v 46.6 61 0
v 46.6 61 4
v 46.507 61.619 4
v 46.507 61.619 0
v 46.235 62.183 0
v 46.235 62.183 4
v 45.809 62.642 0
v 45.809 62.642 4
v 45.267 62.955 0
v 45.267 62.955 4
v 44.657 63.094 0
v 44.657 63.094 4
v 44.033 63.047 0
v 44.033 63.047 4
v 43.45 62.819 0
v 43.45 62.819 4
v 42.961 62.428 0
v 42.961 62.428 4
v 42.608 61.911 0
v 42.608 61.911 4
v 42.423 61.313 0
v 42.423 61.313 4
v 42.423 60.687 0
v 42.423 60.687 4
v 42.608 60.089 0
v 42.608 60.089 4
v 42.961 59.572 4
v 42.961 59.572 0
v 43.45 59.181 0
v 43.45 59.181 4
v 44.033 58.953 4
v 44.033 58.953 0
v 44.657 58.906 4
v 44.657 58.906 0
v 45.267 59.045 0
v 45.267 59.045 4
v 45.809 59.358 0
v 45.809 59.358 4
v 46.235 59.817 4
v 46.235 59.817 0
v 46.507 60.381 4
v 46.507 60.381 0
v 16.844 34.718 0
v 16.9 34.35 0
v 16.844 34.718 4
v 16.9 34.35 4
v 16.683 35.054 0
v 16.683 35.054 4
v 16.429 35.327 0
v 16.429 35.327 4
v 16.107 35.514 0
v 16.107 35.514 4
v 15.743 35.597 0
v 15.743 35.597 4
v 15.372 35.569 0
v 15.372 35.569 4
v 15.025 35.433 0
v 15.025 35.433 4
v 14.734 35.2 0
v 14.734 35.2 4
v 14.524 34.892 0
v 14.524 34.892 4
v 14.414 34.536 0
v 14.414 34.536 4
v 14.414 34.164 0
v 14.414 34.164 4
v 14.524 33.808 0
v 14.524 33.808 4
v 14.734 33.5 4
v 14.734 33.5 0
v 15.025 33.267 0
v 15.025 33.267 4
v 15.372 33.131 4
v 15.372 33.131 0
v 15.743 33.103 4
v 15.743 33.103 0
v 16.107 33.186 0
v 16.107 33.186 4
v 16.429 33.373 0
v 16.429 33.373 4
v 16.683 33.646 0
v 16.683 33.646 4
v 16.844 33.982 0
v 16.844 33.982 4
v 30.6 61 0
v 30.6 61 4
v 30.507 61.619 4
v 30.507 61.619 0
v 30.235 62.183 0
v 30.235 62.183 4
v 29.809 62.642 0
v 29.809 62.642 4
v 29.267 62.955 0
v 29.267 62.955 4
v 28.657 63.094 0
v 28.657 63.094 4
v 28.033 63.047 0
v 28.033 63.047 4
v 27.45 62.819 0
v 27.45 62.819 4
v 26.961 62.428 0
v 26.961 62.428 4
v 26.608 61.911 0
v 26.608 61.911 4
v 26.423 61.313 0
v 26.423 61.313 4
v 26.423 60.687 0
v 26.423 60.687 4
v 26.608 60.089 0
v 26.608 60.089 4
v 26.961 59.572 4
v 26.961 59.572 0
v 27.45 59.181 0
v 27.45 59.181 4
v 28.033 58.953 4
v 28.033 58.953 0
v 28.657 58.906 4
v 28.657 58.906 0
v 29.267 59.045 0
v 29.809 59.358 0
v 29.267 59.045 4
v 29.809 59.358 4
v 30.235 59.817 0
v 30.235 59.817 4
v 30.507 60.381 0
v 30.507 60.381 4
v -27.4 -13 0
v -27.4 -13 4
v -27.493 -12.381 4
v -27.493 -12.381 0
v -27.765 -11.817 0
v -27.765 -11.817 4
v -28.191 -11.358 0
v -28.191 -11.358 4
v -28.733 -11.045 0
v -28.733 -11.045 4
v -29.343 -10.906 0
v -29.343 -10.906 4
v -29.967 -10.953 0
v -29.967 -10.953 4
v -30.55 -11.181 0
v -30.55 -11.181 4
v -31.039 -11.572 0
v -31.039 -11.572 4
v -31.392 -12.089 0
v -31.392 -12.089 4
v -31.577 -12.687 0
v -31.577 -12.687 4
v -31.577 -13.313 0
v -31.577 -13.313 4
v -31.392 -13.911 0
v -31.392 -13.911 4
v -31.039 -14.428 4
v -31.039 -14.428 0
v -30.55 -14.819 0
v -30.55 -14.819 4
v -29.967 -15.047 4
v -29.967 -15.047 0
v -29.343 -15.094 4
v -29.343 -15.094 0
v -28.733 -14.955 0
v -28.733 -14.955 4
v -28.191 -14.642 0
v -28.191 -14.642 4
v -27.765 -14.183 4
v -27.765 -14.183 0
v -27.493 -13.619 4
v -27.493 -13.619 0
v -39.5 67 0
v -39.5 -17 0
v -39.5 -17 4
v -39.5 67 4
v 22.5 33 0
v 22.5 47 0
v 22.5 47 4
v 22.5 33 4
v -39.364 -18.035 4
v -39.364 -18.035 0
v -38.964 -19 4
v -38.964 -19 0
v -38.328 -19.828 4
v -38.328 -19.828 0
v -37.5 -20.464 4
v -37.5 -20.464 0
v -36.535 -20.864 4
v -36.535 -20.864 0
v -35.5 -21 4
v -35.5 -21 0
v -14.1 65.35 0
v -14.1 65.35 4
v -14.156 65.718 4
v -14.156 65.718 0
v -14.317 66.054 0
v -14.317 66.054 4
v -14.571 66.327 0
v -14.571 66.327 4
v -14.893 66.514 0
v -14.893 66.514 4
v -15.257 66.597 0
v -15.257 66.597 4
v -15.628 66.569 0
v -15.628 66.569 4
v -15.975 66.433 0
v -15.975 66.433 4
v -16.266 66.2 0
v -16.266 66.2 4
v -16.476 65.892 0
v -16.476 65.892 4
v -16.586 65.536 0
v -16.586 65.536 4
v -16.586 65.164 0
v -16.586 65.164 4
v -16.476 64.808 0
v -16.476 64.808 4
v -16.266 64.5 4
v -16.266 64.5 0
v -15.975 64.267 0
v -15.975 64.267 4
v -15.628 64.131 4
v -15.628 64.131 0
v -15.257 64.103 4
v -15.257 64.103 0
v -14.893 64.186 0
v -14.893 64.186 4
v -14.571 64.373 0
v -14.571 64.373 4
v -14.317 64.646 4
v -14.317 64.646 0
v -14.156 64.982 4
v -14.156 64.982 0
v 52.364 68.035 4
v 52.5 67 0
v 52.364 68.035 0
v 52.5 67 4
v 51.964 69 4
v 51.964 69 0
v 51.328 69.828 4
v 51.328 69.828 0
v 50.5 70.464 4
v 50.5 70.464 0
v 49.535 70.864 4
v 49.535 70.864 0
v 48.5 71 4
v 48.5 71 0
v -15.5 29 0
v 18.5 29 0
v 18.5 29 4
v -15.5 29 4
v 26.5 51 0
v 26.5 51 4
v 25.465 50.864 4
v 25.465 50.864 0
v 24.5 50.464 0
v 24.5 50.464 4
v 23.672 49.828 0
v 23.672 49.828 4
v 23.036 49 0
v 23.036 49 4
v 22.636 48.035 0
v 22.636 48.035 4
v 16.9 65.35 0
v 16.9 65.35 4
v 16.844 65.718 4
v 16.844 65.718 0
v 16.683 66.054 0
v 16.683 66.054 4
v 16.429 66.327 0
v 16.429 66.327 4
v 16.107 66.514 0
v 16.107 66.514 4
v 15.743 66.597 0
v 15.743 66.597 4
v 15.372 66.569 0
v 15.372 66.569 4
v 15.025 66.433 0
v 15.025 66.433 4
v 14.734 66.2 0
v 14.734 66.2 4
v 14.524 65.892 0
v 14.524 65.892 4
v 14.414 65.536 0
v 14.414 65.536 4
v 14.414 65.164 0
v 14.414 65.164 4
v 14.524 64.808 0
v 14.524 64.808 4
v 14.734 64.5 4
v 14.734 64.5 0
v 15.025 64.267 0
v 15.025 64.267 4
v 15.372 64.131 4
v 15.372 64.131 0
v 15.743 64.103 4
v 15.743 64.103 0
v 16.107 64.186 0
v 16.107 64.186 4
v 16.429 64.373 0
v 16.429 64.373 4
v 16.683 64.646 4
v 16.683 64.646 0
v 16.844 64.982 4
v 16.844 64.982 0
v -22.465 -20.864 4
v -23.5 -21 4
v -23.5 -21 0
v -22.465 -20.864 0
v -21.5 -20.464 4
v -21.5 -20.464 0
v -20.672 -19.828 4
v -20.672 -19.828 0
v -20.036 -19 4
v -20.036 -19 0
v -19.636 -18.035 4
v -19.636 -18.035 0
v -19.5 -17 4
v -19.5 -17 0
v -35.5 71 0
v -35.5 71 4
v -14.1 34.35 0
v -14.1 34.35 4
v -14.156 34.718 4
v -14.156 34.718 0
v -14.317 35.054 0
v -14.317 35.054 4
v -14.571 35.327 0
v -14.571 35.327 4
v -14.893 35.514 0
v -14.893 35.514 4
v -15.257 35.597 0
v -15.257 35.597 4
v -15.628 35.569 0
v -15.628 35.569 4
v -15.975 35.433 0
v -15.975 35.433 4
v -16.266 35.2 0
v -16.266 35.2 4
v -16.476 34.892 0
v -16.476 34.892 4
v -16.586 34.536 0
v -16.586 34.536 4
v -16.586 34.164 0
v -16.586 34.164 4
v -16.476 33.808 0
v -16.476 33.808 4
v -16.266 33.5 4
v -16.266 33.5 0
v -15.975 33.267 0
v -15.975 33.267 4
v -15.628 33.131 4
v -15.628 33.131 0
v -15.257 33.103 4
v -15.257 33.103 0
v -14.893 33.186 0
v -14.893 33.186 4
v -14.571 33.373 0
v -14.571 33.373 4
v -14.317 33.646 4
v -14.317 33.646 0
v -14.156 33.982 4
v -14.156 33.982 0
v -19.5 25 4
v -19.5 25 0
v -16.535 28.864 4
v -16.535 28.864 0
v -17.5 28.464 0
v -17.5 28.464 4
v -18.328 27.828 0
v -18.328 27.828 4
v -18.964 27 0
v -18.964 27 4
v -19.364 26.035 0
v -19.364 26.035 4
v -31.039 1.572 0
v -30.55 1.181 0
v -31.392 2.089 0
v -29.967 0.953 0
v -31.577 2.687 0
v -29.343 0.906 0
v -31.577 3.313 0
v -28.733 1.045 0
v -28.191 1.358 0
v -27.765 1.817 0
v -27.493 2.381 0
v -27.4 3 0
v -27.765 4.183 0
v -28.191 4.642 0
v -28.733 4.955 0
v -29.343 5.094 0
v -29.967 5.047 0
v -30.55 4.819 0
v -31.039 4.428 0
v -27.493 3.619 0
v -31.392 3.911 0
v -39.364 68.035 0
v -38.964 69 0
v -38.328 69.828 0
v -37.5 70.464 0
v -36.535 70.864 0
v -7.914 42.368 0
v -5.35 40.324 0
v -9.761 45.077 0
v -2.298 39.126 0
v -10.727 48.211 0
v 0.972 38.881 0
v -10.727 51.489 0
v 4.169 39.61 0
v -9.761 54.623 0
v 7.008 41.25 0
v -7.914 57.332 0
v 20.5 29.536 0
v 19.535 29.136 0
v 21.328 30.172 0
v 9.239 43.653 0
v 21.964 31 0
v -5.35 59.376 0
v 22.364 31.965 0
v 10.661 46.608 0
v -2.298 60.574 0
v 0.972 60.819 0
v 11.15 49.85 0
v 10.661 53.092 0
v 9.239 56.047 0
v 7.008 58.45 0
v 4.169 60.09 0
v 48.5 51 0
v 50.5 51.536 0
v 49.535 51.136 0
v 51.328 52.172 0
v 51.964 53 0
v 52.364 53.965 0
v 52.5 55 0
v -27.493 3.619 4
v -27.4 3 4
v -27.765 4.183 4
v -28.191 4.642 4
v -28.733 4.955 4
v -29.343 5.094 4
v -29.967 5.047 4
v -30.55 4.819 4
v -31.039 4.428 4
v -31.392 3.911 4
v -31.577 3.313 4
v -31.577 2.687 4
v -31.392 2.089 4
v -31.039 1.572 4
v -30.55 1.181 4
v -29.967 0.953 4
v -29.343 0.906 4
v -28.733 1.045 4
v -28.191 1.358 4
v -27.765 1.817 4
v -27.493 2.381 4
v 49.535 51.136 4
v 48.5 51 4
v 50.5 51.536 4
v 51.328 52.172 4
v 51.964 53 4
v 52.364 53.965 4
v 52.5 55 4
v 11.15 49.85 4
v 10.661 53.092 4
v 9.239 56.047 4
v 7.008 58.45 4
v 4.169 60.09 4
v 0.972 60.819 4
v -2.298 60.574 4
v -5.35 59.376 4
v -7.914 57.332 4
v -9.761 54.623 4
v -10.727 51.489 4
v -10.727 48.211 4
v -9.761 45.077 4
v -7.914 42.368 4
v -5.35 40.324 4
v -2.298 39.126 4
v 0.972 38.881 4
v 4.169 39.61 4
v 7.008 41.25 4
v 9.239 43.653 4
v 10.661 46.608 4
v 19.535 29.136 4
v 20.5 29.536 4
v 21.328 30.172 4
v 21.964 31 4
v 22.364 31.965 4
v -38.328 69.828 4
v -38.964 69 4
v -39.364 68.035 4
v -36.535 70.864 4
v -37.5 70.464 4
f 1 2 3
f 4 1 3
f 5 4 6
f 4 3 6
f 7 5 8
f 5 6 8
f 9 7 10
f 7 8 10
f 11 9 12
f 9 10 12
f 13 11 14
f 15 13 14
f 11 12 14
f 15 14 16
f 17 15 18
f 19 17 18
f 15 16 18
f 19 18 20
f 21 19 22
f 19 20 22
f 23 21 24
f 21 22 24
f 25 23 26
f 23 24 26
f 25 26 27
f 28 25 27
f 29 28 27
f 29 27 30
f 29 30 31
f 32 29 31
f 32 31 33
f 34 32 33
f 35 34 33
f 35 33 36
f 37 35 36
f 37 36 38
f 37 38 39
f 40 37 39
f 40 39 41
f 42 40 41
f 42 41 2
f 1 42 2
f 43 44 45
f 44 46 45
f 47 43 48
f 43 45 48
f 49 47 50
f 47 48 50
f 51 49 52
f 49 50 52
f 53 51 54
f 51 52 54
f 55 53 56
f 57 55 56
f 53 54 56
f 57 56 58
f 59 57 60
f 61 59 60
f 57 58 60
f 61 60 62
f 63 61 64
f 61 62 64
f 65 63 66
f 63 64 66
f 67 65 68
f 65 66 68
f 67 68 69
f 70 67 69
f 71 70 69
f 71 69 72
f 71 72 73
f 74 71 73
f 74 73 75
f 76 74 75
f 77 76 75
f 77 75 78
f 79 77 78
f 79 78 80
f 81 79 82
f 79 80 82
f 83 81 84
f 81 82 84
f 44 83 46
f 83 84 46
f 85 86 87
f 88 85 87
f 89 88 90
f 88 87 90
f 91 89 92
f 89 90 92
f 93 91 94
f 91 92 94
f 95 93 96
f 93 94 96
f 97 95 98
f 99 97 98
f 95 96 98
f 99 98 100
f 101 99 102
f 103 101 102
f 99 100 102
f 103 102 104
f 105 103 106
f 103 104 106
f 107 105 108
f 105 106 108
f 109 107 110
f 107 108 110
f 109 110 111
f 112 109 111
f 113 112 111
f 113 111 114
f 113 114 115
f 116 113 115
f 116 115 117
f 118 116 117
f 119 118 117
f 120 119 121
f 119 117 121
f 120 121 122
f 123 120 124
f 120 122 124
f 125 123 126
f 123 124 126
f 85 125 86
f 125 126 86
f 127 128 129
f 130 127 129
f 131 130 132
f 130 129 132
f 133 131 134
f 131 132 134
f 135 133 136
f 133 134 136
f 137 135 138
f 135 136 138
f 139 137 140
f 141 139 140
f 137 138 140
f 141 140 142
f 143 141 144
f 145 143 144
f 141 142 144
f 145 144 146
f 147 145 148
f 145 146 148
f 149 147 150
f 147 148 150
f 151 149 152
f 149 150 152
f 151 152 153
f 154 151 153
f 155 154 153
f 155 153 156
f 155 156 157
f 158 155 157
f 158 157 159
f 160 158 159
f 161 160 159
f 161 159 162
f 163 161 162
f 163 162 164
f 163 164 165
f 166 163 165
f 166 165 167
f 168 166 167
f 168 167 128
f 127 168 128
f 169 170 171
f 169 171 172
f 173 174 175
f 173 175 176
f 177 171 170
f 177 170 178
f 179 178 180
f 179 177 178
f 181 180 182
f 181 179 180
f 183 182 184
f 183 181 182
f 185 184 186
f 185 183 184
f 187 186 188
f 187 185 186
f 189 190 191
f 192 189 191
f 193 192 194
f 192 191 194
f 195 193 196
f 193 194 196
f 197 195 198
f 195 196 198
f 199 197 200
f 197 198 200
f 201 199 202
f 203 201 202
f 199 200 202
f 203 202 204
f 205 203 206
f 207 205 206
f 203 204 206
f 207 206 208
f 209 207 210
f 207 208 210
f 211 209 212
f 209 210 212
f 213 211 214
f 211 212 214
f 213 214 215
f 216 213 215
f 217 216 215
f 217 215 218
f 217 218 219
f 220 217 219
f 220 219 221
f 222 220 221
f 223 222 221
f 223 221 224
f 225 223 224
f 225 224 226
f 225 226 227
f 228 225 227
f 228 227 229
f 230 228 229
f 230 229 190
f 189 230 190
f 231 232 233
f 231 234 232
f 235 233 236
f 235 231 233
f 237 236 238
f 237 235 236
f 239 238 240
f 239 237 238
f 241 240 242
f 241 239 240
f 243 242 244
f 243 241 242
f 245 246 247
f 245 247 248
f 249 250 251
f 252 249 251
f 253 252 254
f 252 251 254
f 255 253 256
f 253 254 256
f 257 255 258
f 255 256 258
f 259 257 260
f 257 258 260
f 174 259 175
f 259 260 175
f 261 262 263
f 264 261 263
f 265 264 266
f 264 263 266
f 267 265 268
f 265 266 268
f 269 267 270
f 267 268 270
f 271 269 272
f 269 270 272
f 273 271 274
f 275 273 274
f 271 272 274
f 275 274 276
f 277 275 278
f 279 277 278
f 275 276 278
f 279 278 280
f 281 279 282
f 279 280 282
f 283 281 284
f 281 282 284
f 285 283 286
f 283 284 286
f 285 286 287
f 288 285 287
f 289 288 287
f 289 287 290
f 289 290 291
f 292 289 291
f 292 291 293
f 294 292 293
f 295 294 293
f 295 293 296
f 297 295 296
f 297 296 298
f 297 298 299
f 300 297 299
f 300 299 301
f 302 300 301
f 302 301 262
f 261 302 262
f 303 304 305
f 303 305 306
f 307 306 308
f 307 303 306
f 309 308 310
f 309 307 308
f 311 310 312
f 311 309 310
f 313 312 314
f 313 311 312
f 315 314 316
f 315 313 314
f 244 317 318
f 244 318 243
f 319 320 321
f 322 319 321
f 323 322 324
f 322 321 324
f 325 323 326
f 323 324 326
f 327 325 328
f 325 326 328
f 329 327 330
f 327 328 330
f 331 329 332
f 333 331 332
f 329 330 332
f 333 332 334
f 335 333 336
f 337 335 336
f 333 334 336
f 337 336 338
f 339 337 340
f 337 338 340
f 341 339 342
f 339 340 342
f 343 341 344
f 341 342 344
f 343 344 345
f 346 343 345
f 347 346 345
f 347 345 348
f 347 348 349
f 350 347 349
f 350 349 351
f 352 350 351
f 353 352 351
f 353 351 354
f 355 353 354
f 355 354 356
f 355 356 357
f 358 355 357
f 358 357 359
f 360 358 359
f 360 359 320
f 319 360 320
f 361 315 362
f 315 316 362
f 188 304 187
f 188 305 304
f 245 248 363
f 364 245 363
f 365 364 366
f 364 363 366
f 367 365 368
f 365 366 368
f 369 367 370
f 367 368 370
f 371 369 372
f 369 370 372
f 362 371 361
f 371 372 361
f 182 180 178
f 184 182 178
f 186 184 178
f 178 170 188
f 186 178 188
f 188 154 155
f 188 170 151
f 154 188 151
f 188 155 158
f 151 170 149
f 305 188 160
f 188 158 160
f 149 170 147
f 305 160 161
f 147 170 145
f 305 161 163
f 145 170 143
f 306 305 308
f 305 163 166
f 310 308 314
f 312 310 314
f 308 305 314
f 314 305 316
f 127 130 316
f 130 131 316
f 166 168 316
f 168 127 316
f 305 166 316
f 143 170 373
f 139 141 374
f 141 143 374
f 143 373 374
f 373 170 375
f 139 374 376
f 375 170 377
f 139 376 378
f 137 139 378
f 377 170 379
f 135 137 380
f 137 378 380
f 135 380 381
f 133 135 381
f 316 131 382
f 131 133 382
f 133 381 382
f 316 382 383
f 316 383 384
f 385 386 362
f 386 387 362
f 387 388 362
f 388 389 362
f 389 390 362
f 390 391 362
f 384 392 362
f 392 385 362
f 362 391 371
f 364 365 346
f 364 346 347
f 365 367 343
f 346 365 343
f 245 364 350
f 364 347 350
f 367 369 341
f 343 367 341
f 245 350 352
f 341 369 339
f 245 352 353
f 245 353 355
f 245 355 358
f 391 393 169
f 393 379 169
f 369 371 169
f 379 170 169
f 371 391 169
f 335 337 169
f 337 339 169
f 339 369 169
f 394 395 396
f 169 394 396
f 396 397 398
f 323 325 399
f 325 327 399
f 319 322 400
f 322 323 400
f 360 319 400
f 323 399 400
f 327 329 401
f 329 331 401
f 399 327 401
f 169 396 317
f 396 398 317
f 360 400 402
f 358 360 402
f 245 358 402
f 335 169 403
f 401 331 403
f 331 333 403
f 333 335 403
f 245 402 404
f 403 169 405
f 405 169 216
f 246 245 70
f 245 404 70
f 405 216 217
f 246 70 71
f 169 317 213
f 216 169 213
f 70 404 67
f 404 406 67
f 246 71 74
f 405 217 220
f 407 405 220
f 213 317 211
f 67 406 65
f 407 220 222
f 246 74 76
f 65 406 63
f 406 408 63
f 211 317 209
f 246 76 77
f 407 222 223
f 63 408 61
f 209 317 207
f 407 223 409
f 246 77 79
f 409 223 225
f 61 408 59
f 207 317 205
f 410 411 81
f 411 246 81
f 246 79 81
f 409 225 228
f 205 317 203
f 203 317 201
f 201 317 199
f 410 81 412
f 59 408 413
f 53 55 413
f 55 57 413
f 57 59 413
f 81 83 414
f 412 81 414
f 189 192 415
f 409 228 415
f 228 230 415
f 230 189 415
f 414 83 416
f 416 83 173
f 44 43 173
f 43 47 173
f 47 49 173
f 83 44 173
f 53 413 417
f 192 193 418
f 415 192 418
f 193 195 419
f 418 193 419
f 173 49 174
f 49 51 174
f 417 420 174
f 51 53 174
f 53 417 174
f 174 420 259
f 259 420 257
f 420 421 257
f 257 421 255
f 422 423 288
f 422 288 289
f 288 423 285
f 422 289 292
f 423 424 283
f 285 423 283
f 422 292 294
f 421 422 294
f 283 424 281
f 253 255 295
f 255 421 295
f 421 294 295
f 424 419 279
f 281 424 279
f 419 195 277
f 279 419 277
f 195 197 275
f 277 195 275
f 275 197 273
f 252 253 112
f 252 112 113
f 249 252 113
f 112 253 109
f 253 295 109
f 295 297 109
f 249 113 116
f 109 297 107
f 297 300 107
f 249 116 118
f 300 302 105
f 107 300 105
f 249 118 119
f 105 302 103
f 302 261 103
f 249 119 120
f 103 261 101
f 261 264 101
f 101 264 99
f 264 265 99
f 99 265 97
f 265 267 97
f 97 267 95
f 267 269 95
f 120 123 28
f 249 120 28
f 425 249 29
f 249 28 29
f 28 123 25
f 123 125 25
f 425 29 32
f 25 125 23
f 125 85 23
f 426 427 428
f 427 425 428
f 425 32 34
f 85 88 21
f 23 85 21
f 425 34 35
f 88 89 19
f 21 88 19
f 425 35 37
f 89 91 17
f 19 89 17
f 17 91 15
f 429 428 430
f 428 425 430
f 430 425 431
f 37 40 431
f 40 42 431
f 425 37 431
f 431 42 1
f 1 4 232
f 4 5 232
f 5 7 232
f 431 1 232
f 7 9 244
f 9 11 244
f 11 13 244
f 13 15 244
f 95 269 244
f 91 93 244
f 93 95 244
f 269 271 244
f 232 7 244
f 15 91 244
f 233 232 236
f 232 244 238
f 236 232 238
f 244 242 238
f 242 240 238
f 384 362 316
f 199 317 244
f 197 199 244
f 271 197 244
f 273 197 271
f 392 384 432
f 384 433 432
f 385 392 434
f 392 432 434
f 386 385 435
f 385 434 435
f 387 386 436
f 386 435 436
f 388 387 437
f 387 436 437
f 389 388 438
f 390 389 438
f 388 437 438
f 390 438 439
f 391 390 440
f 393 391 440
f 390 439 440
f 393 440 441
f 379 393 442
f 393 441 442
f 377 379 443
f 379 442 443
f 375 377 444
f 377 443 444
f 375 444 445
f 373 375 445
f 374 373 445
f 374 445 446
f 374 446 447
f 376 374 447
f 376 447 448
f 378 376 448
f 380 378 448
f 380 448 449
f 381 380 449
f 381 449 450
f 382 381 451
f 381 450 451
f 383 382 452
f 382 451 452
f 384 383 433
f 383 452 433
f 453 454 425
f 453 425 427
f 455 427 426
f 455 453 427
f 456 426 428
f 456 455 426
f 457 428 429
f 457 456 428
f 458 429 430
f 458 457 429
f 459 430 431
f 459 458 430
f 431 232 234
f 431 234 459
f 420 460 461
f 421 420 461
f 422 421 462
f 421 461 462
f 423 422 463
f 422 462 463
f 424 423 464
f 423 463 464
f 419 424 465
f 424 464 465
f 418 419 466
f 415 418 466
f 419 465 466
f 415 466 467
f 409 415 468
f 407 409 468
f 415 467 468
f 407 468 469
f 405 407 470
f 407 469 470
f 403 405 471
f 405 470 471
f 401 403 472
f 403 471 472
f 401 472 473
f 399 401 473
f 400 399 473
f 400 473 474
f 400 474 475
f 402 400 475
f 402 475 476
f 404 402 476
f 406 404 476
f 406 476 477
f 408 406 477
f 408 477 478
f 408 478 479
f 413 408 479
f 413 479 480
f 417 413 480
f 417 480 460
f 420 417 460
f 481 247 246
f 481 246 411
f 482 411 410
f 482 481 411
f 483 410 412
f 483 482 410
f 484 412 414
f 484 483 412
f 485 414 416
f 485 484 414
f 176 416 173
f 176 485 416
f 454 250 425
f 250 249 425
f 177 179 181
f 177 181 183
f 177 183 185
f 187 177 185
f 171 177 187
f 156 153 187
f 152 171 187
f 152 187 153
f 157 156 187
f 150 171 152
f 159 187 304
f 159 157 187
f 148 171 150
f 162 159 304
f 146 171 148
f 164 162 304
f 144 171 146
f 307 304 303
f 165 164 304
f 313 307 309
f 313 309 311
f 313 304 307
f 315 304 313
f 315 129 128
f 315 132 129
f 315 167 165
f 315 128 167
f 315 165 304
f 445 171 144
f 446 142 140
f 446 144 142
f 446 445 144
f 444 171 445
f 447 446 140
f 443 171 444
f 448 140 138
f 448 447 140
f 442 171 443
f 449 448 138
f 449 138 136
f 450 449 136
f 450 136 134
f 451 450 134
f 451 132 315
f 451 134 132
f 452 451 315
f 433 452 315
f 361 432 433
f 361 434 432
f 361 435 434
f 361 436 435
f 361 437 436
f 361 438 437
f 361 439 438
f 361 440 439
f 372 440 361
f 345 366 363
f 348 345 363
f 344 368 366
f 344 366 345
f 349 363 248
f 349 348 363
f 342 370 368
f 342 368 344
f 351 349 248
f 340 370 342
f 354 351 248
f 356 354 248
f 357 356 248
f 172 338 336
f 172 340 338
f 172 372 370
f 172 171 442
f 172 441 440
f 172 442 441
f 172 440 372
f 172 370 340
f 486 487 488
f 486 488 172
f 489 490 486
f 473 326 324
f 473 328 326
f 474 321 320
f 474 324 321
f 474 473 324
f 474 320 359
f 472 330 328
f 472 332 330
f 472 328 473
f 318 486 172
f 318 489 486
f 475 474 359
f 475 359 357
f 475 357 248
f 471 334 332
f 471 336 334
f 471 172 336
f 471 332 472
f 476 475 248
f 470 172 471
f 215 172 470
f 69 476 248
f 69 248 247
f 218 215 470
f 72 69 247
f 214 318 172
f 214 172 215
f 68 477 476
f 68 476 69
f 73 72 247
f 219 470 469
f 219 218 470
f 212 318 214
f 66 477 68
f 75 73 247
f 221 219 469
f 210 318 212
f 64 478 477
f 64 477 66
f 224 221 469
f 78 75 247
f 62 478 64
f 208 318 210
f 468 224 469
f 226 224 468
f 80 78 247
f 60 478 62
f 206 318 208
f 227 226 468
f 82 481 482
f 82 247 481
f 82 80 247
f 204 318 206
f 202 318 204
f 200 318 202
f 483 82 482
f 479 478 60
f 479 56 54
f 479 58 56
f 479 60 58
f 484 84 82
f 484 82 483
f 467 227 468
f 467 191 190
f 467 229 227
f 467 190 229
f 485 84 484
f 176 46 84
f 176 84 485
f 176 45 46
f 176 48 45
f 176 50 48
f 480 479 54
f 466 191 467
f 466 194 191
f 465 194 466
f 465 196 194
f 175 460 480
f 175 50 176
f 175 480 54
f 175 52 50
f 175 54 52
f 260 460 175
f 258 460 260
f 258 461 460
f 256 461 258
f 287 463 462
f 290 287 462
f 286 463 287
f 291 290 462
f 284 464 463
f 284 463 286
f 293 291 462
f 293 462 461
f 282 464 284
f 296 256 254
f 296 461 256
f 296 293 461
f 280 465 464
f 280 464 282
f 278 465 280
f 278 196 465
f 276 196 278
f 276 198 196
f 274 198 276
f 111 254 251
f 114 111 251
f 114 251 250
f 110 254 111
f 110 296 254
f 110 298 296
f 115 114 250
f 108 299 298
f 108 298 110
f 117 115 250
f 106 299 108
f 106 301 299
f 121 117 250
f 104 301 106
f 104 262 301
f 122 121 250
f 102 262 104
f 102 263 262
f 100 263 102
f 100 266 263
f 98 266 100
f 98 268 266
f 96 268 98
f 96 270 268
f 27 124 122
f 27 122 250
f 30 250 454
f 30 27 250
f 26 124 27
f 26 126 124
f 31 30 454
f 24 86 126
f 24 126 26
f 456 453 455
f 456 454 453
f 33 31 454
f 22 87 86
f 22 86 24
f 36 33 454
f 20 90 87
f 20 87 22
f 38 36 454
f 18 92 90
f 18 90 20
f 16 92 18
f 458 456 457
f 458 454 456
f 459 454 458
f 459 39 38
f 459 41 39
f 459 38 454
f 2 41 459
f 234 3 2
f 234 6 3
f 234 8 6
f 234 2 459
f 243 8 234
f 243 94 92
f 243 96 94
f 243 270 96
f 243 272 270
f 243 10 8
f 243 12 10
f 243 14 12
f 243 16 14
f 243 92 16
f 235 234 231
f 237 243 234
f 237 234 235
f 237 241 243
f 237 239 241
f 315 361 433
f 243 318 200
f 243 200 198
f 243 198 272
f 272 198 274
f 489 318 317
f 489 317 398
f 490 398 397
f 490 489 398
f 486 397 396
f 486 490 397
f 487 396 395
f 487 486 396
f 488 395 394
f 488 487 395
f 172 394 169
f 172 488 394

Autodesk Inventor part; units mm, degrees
ref_plane "YZ Plane" through (0, 0, 0) normal (1, 0, 0) x (0, 1, 0)
ref_plane "XZ Plane" through (0, 0, 0) normal (0, 1, 0) x (-1, 0, 0)
ref_plane "XY Plane" through (0, 0, 0) normal (0, 0, 1) x (1, 0, 0)
sketch "Эскиз1" plane through (0, 0, 0) normal (0, 0, 1) x (1, 0, 0)
  line L0 (-34.95, 71) -> (-39.5, 71) projected
  line L1 (-39.5, 71) -> (52.5, 71)
  line L2 (52.5, 71) -> (52.5, 51)
  line L3 (-19.5, -21) -> (-39.5, -21)
  line L4 (-39.5, -21) -> (-39.5, 71)
  line L5 (-21, 66.8757) -> (-21, 32.8243) construction
  line L6 (-19.5, 71) -> (22.5, 71)
  line L7 (22.5, 51) -> (22.5, 29)
  line L8 (22.5, 29) -> (-19.5, 29)
  line L9 (-19.5, 29) -> (-19.5, 71)
  line L10 (-19.5, 29) -> (22.5, 29)
  line L11 (-19.5, -21) -> (-19.5, 29)
  line L12 (22.5, 29) -> (22.5, 51)
  line L13 (22.5, 51) -> (52.5, 51)
  dimension "d14" = 92
  dimension "d20" = 20
  dimension "d21" = 42
  dimension "d22" = 42
  dimension "d24" = 92
  dimension "d25" = 30
extrude "Выдавливание1" add sketch "Эскиз1" along normal blind 4
sketch "Эскиз2" plane through (0, 0, 4) normal (0, 0, 1) x (1, 0, 0)
  circle A0 centre (0.15, 49.85) radius 11 projected
  line L0 (52.5, 51) -> (52.5, 71) projected
  line L1 (52.5, 61) -> (-39.5, 61) construction
  line L2 (-39.5, 71) -> (-39.5, -21) projected
  line L3 (-39.5, -21) -> (-19.5, -21) projected
  line L4 (-29.5, -21) -> (-29.5, 71) construction
  line L5 (52.5, 71) -> (-39.5, 71) projected
  circle A1 centre (44.5, 61) radius 2.1
  circle A2 centre (28.5, 61) radius 2.1
  circle A3 centre (-15.35, 34.35) radius 1.25 projected
  circle A4 centre (15.65, 34.35) radius 1.25 projected
  circle A5 centre (15.65, 65.35) radius 1.25 projected
  circle A6 centre (-15.35, 65.35) radius 1.25 projected
  line L6 (-39.5, 71) -> (-29.5, 61) construction
  circle A7 centre (-29.5, -13) radius 2.1
  circle A8 centre (-29.5, 3) radius 2.1
  dimension "d26" = 4.2
  dimension "d27" = 4.2
  dimension "d28" = 8
  dimension "d29" = 16
extrude "Выдавливание2" cut sketch "Эскиз2" against normal blind 4
fillet "Сопряжение1" radius 4 8 edges at (-39.5, -21, 2) (-19.5, -21, 2) (-19.5, 29, 2) (22.5, 29, 2) (22.5, 51, 2) (52.5, 51, 2) (52.5, 71, 2) (-39.5, 71, 2)
properties part number "креп_мотора"
